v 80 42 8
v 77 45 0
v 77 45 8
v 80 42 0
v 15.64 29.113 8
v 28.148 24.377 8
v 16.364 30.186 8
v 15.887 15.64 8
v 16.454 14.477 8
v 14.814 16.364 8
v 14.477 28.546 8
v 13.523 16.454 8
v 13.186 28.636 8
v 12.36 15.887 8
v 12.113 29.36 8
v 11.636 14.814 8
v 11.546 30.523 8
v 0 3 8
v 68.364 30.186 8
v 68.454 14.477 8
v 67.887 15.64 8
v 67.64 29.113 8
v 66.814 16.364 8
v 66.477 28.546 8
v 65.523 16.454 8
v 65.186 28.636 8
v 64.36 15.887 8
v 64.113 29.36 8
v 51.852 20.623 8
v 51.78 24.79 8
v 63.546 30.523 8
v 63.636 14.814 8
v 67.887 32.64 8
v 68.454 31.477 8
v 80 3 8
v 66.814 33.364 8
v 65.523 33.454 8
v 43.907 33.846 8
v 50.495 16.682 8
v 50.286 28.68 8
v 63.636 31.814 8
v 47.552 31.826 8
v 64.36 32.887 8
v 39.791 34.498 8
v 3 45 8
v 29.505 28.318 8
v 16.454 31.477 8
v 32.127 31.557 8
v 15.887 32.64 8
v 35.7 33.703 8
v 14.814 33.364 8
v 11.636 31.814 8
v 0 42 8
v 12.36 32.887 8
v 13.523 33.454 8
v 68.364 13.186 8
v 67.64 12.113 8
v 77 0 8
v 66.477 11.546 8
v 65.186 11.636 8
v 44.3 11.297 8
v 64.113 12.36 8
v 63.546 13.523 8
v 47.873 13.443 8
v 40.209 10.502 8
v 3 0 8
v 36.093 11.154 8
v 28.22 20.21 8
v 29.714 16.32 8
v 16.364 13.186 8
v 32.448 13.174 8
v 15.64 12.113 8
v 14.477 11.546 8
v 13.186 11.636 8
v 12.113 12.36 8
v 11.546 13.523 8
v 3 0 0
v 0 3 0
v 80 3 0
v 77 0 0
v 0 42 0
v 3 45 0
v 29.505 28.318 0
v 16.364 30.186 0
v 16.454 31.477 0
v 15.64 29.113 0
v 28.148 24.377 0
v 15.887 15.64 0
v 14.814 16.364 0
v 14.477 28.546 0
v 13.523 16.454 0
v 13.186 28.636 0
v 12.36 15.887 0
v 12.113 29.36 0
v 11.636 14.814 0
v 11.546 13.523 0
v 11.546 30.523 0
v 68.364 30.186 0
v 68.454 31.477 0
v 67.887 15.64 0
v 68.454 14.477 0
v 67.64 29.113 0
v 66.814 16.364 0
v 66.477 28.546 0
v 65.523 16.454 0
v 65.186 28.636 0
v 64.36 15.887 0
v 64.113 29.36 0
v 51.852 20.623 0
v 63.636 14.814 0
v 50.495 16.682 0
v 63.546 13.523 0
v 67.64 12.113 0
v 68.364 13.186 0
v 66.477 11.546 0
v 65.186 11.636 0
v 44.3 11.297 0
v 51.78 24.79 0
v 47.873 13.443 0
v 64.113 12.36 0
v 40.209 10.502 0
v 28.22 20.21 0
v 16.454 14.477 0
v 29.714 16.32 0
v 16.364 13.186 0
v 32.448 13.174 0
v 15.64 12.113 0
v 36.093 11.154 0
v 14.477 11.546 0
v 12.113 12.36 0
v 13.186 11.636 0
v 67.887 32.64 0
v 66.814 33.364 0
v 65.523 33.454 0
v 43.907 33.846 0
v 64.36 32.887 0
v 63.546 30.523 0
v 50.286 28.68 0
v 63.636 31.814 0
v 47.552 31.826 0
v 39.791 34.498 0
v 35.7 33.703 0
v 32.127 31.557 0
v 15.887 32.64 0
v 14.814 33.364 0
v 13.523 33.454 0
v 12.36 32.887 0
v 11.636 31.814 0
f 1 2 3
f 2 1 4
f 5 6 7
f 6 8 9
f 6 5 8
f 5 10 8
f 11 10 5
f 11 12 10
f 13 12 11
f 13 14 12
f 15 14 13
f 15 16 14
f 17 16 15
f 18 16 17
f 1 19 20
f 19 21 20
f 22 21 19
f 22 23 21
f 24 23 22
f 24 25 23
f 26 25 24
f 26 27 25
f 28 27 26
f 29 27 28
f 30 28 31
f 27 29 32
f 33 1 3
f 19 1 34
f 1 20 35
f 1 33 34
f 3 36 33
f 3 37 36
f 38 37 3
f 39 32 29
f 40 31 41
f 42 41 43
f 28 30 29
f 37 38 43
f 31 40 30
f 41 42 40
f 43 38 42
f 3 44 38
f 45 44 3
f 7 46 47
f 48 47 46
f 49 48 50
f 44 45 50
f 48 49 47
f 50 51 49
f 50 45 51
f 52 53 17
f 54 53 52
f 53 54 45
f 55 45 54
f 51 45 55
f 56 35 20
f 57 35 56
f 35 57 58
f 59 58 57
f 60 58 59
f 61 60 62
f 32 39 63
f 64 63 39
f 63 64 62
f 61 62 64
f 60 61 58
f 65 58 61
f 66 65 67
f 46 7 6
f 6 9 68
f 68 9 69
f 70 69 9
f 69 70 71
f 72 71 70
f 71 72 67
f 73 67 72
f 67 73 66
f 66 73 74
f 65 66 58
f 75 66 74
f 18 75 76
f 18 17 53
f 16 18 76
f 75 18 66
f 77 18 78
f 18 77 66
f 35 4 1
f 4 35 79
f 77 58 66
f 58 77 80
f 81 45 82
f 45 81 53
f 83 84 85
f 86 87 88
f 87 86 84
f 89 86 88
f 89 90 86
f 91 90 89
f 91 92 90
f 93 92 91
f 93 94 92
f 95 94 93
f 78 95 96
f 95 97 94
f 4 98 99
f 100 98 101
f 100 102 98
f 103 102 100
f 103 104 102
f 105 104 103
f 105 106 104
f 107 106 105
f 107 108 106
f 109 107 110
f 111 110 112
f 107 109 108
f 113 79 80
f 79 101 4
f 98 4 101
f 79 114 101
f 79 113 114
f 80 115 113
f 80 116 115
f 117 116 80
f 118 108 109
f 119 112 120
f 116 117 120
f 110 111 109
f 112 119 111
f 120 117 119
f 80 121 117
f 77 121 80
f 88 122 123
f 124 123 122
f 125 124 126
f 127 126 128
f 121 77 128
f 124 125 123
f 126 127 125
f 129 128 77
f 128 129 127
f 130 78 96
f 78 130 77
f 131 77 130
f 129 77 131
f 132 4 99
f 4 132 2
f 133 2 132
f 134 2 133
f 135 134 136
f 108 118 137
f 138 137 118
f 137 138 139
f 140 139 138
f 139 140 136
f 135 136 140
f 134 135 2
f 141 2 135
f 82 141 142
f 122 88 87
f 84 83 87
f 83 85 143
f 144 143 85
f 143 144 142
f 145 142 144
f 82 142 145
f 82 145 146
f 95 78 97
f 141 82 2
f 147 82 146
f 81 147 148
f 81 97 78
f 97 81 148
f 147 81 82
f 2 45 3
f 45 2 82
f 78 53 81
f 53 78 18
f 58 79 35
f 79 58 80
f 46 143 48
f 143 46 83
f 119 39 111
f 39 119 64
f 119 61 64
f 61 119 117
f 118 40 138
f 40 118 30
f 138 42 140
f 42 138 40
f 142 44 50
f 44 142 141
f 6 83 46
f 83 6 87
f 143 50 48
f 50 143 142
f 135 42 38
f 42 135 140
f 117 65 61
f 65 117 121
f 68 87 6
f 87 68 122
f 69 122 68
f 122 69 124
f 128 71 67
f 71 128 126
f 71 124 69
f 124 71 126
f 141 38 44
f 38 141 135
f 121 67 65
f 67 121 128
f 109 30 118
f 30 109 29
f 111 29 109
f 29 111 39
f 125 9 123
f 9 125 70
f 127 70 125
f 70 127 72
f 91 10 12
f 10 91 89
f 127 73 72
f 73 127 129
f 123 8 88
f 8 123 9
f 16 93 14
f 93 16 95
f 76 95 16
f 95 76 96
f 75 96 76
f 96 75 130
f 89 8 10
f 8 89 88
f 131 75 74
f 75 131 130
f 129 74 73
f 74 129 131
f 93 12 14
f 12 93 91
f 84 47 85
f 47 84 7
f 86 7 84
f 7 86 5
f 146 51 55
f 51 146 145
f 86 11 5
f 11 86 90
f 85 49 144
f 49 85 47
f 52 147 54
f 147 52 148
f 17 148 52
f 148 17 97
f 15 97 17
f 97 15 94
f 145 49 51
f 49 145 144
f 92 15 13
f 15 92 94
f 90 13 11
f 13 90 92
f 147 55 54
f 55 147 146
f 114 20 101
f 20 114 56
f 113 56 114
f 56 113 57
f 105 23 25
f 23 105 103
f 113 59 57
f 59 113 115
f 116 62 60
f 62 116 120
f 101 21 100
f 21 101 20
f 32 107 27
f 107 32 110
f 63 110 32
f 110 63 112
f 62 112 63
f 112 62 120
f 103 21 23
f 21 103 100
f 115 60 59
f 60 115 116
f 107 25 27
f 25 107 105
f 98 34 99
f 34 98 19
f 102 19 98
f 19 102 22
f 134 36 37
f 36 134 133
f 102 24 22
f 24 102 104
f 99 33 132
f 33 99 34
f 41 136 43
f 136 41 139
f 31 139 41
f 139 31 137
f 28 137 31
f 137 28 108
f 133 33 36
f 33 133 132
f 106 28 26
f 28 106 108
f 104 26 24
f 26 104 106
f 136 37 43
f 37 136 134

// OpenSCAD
$fn = 32;

// ----------------------------------------------------------------------
// Spacer plate: rect 80 x 45
// ----------------------------------------------------------------------

// --- parameters (mm) ---
bore_r = 12;              // centre bore radius
bolt_r = 2.5;             // bolt hole radius
plate_t = 8;              // plate thickness, Z (extrusion height)
plate_l = 80;             // plate length, X
plate_w = 45;             // plate width, Y
inset = 14;               // corner hole inset

profile = [[3, 0], [77, 0], [80, 3], [80, 42], [77, 45], [3, 45], [0, 42], [0, 3]];  // primary outline, 8 points, counter clockwise
void_1 = [[51.78, 24.79], [50.286, 28.68], [47.552, 31.826], [43.907, 33.846], [39.791, 34.498], [35.7, 33.703], [32.127, 31.557], [29.505, 28.318], [28.148, 24.377], [28.22, 20.21], [29.714, 16.32], [32.448, 13.174], [36.093, 11.154], [40.209, 10.502], [44.3, 11.297], [47.873, 13.443], [50.495, 16.682], [51.852, 20.623]];  // centre bore, 18 points
void_2 = [[16.454, 14.477], [15.887, 15.64], [14.814, 16.364], [13.523, 16.454], [12.36, 15.887], [11.636, 14.814], [11.546, 13.523], [12.113, 12.36], [13.186, 11.636], [14.477, 11.546], [15.64, 12.113], [16.364, 13.186]];  // corner hole, 12 points
void_3 = [[16.454, 31.477], [15.887, 32.64], [14.814, 33.364], [13.523, 33.454], [12.36, 32.887], [11.636, 31.814], [11.546, 30.523], [12.113, 29.36], [13.186, 28.636], [14.477, 28.546], [15.64, 29.113], [16.364, 30.186]];  // corner hole, 12 points
void_4 = [[68.454, 14.477], [67.887, 15.64], [66.814, 16.364], [65.523, 16.454], [64.36, 15.887], [63.636, 14.814], [63.546, 13.523], [64.113, 12.36], [65.186, 11.636], [66.477, 11.546], [67.64, 12.113], [68.364, 13.186]];  // corner hole, 12 points
void_5 = [[68.454, 31.477], [67.887, 32.64], [66.814, 33.364], [65.523, 33.454], [64.36, 32.887], [63.636, 31.814], [63.546, 30.523], [64.113, 29.36], [65.186, 28.636], [66.477, 28.546], [67.64, 29.113], [68.364, 30.186]];  // corner hole, 12 points

// --- the one profile operation ---
difference() {
  linear_extrude(height = plate_t) polygon(points = profile);
  translate([0, 0, -1])
    linear_extrude(height = plate_t + 2) polygon(points = void_1);
  translate([0, 0, -1])
    linear_extrude(height = plate_t + 2) polygon(points = void_2);
  translate([0, 0, -1])
    linear_extrude(height = plate_t + 2) polygon(points = void_3);
  translate([0, 0, -1])
    linear_extrude(height = plate_t + 2) polygon(points = void_4);
  translate([0, 0, -1])
    linear_extrude(height = plate_t + 2) polygon(points = void_5);
}
